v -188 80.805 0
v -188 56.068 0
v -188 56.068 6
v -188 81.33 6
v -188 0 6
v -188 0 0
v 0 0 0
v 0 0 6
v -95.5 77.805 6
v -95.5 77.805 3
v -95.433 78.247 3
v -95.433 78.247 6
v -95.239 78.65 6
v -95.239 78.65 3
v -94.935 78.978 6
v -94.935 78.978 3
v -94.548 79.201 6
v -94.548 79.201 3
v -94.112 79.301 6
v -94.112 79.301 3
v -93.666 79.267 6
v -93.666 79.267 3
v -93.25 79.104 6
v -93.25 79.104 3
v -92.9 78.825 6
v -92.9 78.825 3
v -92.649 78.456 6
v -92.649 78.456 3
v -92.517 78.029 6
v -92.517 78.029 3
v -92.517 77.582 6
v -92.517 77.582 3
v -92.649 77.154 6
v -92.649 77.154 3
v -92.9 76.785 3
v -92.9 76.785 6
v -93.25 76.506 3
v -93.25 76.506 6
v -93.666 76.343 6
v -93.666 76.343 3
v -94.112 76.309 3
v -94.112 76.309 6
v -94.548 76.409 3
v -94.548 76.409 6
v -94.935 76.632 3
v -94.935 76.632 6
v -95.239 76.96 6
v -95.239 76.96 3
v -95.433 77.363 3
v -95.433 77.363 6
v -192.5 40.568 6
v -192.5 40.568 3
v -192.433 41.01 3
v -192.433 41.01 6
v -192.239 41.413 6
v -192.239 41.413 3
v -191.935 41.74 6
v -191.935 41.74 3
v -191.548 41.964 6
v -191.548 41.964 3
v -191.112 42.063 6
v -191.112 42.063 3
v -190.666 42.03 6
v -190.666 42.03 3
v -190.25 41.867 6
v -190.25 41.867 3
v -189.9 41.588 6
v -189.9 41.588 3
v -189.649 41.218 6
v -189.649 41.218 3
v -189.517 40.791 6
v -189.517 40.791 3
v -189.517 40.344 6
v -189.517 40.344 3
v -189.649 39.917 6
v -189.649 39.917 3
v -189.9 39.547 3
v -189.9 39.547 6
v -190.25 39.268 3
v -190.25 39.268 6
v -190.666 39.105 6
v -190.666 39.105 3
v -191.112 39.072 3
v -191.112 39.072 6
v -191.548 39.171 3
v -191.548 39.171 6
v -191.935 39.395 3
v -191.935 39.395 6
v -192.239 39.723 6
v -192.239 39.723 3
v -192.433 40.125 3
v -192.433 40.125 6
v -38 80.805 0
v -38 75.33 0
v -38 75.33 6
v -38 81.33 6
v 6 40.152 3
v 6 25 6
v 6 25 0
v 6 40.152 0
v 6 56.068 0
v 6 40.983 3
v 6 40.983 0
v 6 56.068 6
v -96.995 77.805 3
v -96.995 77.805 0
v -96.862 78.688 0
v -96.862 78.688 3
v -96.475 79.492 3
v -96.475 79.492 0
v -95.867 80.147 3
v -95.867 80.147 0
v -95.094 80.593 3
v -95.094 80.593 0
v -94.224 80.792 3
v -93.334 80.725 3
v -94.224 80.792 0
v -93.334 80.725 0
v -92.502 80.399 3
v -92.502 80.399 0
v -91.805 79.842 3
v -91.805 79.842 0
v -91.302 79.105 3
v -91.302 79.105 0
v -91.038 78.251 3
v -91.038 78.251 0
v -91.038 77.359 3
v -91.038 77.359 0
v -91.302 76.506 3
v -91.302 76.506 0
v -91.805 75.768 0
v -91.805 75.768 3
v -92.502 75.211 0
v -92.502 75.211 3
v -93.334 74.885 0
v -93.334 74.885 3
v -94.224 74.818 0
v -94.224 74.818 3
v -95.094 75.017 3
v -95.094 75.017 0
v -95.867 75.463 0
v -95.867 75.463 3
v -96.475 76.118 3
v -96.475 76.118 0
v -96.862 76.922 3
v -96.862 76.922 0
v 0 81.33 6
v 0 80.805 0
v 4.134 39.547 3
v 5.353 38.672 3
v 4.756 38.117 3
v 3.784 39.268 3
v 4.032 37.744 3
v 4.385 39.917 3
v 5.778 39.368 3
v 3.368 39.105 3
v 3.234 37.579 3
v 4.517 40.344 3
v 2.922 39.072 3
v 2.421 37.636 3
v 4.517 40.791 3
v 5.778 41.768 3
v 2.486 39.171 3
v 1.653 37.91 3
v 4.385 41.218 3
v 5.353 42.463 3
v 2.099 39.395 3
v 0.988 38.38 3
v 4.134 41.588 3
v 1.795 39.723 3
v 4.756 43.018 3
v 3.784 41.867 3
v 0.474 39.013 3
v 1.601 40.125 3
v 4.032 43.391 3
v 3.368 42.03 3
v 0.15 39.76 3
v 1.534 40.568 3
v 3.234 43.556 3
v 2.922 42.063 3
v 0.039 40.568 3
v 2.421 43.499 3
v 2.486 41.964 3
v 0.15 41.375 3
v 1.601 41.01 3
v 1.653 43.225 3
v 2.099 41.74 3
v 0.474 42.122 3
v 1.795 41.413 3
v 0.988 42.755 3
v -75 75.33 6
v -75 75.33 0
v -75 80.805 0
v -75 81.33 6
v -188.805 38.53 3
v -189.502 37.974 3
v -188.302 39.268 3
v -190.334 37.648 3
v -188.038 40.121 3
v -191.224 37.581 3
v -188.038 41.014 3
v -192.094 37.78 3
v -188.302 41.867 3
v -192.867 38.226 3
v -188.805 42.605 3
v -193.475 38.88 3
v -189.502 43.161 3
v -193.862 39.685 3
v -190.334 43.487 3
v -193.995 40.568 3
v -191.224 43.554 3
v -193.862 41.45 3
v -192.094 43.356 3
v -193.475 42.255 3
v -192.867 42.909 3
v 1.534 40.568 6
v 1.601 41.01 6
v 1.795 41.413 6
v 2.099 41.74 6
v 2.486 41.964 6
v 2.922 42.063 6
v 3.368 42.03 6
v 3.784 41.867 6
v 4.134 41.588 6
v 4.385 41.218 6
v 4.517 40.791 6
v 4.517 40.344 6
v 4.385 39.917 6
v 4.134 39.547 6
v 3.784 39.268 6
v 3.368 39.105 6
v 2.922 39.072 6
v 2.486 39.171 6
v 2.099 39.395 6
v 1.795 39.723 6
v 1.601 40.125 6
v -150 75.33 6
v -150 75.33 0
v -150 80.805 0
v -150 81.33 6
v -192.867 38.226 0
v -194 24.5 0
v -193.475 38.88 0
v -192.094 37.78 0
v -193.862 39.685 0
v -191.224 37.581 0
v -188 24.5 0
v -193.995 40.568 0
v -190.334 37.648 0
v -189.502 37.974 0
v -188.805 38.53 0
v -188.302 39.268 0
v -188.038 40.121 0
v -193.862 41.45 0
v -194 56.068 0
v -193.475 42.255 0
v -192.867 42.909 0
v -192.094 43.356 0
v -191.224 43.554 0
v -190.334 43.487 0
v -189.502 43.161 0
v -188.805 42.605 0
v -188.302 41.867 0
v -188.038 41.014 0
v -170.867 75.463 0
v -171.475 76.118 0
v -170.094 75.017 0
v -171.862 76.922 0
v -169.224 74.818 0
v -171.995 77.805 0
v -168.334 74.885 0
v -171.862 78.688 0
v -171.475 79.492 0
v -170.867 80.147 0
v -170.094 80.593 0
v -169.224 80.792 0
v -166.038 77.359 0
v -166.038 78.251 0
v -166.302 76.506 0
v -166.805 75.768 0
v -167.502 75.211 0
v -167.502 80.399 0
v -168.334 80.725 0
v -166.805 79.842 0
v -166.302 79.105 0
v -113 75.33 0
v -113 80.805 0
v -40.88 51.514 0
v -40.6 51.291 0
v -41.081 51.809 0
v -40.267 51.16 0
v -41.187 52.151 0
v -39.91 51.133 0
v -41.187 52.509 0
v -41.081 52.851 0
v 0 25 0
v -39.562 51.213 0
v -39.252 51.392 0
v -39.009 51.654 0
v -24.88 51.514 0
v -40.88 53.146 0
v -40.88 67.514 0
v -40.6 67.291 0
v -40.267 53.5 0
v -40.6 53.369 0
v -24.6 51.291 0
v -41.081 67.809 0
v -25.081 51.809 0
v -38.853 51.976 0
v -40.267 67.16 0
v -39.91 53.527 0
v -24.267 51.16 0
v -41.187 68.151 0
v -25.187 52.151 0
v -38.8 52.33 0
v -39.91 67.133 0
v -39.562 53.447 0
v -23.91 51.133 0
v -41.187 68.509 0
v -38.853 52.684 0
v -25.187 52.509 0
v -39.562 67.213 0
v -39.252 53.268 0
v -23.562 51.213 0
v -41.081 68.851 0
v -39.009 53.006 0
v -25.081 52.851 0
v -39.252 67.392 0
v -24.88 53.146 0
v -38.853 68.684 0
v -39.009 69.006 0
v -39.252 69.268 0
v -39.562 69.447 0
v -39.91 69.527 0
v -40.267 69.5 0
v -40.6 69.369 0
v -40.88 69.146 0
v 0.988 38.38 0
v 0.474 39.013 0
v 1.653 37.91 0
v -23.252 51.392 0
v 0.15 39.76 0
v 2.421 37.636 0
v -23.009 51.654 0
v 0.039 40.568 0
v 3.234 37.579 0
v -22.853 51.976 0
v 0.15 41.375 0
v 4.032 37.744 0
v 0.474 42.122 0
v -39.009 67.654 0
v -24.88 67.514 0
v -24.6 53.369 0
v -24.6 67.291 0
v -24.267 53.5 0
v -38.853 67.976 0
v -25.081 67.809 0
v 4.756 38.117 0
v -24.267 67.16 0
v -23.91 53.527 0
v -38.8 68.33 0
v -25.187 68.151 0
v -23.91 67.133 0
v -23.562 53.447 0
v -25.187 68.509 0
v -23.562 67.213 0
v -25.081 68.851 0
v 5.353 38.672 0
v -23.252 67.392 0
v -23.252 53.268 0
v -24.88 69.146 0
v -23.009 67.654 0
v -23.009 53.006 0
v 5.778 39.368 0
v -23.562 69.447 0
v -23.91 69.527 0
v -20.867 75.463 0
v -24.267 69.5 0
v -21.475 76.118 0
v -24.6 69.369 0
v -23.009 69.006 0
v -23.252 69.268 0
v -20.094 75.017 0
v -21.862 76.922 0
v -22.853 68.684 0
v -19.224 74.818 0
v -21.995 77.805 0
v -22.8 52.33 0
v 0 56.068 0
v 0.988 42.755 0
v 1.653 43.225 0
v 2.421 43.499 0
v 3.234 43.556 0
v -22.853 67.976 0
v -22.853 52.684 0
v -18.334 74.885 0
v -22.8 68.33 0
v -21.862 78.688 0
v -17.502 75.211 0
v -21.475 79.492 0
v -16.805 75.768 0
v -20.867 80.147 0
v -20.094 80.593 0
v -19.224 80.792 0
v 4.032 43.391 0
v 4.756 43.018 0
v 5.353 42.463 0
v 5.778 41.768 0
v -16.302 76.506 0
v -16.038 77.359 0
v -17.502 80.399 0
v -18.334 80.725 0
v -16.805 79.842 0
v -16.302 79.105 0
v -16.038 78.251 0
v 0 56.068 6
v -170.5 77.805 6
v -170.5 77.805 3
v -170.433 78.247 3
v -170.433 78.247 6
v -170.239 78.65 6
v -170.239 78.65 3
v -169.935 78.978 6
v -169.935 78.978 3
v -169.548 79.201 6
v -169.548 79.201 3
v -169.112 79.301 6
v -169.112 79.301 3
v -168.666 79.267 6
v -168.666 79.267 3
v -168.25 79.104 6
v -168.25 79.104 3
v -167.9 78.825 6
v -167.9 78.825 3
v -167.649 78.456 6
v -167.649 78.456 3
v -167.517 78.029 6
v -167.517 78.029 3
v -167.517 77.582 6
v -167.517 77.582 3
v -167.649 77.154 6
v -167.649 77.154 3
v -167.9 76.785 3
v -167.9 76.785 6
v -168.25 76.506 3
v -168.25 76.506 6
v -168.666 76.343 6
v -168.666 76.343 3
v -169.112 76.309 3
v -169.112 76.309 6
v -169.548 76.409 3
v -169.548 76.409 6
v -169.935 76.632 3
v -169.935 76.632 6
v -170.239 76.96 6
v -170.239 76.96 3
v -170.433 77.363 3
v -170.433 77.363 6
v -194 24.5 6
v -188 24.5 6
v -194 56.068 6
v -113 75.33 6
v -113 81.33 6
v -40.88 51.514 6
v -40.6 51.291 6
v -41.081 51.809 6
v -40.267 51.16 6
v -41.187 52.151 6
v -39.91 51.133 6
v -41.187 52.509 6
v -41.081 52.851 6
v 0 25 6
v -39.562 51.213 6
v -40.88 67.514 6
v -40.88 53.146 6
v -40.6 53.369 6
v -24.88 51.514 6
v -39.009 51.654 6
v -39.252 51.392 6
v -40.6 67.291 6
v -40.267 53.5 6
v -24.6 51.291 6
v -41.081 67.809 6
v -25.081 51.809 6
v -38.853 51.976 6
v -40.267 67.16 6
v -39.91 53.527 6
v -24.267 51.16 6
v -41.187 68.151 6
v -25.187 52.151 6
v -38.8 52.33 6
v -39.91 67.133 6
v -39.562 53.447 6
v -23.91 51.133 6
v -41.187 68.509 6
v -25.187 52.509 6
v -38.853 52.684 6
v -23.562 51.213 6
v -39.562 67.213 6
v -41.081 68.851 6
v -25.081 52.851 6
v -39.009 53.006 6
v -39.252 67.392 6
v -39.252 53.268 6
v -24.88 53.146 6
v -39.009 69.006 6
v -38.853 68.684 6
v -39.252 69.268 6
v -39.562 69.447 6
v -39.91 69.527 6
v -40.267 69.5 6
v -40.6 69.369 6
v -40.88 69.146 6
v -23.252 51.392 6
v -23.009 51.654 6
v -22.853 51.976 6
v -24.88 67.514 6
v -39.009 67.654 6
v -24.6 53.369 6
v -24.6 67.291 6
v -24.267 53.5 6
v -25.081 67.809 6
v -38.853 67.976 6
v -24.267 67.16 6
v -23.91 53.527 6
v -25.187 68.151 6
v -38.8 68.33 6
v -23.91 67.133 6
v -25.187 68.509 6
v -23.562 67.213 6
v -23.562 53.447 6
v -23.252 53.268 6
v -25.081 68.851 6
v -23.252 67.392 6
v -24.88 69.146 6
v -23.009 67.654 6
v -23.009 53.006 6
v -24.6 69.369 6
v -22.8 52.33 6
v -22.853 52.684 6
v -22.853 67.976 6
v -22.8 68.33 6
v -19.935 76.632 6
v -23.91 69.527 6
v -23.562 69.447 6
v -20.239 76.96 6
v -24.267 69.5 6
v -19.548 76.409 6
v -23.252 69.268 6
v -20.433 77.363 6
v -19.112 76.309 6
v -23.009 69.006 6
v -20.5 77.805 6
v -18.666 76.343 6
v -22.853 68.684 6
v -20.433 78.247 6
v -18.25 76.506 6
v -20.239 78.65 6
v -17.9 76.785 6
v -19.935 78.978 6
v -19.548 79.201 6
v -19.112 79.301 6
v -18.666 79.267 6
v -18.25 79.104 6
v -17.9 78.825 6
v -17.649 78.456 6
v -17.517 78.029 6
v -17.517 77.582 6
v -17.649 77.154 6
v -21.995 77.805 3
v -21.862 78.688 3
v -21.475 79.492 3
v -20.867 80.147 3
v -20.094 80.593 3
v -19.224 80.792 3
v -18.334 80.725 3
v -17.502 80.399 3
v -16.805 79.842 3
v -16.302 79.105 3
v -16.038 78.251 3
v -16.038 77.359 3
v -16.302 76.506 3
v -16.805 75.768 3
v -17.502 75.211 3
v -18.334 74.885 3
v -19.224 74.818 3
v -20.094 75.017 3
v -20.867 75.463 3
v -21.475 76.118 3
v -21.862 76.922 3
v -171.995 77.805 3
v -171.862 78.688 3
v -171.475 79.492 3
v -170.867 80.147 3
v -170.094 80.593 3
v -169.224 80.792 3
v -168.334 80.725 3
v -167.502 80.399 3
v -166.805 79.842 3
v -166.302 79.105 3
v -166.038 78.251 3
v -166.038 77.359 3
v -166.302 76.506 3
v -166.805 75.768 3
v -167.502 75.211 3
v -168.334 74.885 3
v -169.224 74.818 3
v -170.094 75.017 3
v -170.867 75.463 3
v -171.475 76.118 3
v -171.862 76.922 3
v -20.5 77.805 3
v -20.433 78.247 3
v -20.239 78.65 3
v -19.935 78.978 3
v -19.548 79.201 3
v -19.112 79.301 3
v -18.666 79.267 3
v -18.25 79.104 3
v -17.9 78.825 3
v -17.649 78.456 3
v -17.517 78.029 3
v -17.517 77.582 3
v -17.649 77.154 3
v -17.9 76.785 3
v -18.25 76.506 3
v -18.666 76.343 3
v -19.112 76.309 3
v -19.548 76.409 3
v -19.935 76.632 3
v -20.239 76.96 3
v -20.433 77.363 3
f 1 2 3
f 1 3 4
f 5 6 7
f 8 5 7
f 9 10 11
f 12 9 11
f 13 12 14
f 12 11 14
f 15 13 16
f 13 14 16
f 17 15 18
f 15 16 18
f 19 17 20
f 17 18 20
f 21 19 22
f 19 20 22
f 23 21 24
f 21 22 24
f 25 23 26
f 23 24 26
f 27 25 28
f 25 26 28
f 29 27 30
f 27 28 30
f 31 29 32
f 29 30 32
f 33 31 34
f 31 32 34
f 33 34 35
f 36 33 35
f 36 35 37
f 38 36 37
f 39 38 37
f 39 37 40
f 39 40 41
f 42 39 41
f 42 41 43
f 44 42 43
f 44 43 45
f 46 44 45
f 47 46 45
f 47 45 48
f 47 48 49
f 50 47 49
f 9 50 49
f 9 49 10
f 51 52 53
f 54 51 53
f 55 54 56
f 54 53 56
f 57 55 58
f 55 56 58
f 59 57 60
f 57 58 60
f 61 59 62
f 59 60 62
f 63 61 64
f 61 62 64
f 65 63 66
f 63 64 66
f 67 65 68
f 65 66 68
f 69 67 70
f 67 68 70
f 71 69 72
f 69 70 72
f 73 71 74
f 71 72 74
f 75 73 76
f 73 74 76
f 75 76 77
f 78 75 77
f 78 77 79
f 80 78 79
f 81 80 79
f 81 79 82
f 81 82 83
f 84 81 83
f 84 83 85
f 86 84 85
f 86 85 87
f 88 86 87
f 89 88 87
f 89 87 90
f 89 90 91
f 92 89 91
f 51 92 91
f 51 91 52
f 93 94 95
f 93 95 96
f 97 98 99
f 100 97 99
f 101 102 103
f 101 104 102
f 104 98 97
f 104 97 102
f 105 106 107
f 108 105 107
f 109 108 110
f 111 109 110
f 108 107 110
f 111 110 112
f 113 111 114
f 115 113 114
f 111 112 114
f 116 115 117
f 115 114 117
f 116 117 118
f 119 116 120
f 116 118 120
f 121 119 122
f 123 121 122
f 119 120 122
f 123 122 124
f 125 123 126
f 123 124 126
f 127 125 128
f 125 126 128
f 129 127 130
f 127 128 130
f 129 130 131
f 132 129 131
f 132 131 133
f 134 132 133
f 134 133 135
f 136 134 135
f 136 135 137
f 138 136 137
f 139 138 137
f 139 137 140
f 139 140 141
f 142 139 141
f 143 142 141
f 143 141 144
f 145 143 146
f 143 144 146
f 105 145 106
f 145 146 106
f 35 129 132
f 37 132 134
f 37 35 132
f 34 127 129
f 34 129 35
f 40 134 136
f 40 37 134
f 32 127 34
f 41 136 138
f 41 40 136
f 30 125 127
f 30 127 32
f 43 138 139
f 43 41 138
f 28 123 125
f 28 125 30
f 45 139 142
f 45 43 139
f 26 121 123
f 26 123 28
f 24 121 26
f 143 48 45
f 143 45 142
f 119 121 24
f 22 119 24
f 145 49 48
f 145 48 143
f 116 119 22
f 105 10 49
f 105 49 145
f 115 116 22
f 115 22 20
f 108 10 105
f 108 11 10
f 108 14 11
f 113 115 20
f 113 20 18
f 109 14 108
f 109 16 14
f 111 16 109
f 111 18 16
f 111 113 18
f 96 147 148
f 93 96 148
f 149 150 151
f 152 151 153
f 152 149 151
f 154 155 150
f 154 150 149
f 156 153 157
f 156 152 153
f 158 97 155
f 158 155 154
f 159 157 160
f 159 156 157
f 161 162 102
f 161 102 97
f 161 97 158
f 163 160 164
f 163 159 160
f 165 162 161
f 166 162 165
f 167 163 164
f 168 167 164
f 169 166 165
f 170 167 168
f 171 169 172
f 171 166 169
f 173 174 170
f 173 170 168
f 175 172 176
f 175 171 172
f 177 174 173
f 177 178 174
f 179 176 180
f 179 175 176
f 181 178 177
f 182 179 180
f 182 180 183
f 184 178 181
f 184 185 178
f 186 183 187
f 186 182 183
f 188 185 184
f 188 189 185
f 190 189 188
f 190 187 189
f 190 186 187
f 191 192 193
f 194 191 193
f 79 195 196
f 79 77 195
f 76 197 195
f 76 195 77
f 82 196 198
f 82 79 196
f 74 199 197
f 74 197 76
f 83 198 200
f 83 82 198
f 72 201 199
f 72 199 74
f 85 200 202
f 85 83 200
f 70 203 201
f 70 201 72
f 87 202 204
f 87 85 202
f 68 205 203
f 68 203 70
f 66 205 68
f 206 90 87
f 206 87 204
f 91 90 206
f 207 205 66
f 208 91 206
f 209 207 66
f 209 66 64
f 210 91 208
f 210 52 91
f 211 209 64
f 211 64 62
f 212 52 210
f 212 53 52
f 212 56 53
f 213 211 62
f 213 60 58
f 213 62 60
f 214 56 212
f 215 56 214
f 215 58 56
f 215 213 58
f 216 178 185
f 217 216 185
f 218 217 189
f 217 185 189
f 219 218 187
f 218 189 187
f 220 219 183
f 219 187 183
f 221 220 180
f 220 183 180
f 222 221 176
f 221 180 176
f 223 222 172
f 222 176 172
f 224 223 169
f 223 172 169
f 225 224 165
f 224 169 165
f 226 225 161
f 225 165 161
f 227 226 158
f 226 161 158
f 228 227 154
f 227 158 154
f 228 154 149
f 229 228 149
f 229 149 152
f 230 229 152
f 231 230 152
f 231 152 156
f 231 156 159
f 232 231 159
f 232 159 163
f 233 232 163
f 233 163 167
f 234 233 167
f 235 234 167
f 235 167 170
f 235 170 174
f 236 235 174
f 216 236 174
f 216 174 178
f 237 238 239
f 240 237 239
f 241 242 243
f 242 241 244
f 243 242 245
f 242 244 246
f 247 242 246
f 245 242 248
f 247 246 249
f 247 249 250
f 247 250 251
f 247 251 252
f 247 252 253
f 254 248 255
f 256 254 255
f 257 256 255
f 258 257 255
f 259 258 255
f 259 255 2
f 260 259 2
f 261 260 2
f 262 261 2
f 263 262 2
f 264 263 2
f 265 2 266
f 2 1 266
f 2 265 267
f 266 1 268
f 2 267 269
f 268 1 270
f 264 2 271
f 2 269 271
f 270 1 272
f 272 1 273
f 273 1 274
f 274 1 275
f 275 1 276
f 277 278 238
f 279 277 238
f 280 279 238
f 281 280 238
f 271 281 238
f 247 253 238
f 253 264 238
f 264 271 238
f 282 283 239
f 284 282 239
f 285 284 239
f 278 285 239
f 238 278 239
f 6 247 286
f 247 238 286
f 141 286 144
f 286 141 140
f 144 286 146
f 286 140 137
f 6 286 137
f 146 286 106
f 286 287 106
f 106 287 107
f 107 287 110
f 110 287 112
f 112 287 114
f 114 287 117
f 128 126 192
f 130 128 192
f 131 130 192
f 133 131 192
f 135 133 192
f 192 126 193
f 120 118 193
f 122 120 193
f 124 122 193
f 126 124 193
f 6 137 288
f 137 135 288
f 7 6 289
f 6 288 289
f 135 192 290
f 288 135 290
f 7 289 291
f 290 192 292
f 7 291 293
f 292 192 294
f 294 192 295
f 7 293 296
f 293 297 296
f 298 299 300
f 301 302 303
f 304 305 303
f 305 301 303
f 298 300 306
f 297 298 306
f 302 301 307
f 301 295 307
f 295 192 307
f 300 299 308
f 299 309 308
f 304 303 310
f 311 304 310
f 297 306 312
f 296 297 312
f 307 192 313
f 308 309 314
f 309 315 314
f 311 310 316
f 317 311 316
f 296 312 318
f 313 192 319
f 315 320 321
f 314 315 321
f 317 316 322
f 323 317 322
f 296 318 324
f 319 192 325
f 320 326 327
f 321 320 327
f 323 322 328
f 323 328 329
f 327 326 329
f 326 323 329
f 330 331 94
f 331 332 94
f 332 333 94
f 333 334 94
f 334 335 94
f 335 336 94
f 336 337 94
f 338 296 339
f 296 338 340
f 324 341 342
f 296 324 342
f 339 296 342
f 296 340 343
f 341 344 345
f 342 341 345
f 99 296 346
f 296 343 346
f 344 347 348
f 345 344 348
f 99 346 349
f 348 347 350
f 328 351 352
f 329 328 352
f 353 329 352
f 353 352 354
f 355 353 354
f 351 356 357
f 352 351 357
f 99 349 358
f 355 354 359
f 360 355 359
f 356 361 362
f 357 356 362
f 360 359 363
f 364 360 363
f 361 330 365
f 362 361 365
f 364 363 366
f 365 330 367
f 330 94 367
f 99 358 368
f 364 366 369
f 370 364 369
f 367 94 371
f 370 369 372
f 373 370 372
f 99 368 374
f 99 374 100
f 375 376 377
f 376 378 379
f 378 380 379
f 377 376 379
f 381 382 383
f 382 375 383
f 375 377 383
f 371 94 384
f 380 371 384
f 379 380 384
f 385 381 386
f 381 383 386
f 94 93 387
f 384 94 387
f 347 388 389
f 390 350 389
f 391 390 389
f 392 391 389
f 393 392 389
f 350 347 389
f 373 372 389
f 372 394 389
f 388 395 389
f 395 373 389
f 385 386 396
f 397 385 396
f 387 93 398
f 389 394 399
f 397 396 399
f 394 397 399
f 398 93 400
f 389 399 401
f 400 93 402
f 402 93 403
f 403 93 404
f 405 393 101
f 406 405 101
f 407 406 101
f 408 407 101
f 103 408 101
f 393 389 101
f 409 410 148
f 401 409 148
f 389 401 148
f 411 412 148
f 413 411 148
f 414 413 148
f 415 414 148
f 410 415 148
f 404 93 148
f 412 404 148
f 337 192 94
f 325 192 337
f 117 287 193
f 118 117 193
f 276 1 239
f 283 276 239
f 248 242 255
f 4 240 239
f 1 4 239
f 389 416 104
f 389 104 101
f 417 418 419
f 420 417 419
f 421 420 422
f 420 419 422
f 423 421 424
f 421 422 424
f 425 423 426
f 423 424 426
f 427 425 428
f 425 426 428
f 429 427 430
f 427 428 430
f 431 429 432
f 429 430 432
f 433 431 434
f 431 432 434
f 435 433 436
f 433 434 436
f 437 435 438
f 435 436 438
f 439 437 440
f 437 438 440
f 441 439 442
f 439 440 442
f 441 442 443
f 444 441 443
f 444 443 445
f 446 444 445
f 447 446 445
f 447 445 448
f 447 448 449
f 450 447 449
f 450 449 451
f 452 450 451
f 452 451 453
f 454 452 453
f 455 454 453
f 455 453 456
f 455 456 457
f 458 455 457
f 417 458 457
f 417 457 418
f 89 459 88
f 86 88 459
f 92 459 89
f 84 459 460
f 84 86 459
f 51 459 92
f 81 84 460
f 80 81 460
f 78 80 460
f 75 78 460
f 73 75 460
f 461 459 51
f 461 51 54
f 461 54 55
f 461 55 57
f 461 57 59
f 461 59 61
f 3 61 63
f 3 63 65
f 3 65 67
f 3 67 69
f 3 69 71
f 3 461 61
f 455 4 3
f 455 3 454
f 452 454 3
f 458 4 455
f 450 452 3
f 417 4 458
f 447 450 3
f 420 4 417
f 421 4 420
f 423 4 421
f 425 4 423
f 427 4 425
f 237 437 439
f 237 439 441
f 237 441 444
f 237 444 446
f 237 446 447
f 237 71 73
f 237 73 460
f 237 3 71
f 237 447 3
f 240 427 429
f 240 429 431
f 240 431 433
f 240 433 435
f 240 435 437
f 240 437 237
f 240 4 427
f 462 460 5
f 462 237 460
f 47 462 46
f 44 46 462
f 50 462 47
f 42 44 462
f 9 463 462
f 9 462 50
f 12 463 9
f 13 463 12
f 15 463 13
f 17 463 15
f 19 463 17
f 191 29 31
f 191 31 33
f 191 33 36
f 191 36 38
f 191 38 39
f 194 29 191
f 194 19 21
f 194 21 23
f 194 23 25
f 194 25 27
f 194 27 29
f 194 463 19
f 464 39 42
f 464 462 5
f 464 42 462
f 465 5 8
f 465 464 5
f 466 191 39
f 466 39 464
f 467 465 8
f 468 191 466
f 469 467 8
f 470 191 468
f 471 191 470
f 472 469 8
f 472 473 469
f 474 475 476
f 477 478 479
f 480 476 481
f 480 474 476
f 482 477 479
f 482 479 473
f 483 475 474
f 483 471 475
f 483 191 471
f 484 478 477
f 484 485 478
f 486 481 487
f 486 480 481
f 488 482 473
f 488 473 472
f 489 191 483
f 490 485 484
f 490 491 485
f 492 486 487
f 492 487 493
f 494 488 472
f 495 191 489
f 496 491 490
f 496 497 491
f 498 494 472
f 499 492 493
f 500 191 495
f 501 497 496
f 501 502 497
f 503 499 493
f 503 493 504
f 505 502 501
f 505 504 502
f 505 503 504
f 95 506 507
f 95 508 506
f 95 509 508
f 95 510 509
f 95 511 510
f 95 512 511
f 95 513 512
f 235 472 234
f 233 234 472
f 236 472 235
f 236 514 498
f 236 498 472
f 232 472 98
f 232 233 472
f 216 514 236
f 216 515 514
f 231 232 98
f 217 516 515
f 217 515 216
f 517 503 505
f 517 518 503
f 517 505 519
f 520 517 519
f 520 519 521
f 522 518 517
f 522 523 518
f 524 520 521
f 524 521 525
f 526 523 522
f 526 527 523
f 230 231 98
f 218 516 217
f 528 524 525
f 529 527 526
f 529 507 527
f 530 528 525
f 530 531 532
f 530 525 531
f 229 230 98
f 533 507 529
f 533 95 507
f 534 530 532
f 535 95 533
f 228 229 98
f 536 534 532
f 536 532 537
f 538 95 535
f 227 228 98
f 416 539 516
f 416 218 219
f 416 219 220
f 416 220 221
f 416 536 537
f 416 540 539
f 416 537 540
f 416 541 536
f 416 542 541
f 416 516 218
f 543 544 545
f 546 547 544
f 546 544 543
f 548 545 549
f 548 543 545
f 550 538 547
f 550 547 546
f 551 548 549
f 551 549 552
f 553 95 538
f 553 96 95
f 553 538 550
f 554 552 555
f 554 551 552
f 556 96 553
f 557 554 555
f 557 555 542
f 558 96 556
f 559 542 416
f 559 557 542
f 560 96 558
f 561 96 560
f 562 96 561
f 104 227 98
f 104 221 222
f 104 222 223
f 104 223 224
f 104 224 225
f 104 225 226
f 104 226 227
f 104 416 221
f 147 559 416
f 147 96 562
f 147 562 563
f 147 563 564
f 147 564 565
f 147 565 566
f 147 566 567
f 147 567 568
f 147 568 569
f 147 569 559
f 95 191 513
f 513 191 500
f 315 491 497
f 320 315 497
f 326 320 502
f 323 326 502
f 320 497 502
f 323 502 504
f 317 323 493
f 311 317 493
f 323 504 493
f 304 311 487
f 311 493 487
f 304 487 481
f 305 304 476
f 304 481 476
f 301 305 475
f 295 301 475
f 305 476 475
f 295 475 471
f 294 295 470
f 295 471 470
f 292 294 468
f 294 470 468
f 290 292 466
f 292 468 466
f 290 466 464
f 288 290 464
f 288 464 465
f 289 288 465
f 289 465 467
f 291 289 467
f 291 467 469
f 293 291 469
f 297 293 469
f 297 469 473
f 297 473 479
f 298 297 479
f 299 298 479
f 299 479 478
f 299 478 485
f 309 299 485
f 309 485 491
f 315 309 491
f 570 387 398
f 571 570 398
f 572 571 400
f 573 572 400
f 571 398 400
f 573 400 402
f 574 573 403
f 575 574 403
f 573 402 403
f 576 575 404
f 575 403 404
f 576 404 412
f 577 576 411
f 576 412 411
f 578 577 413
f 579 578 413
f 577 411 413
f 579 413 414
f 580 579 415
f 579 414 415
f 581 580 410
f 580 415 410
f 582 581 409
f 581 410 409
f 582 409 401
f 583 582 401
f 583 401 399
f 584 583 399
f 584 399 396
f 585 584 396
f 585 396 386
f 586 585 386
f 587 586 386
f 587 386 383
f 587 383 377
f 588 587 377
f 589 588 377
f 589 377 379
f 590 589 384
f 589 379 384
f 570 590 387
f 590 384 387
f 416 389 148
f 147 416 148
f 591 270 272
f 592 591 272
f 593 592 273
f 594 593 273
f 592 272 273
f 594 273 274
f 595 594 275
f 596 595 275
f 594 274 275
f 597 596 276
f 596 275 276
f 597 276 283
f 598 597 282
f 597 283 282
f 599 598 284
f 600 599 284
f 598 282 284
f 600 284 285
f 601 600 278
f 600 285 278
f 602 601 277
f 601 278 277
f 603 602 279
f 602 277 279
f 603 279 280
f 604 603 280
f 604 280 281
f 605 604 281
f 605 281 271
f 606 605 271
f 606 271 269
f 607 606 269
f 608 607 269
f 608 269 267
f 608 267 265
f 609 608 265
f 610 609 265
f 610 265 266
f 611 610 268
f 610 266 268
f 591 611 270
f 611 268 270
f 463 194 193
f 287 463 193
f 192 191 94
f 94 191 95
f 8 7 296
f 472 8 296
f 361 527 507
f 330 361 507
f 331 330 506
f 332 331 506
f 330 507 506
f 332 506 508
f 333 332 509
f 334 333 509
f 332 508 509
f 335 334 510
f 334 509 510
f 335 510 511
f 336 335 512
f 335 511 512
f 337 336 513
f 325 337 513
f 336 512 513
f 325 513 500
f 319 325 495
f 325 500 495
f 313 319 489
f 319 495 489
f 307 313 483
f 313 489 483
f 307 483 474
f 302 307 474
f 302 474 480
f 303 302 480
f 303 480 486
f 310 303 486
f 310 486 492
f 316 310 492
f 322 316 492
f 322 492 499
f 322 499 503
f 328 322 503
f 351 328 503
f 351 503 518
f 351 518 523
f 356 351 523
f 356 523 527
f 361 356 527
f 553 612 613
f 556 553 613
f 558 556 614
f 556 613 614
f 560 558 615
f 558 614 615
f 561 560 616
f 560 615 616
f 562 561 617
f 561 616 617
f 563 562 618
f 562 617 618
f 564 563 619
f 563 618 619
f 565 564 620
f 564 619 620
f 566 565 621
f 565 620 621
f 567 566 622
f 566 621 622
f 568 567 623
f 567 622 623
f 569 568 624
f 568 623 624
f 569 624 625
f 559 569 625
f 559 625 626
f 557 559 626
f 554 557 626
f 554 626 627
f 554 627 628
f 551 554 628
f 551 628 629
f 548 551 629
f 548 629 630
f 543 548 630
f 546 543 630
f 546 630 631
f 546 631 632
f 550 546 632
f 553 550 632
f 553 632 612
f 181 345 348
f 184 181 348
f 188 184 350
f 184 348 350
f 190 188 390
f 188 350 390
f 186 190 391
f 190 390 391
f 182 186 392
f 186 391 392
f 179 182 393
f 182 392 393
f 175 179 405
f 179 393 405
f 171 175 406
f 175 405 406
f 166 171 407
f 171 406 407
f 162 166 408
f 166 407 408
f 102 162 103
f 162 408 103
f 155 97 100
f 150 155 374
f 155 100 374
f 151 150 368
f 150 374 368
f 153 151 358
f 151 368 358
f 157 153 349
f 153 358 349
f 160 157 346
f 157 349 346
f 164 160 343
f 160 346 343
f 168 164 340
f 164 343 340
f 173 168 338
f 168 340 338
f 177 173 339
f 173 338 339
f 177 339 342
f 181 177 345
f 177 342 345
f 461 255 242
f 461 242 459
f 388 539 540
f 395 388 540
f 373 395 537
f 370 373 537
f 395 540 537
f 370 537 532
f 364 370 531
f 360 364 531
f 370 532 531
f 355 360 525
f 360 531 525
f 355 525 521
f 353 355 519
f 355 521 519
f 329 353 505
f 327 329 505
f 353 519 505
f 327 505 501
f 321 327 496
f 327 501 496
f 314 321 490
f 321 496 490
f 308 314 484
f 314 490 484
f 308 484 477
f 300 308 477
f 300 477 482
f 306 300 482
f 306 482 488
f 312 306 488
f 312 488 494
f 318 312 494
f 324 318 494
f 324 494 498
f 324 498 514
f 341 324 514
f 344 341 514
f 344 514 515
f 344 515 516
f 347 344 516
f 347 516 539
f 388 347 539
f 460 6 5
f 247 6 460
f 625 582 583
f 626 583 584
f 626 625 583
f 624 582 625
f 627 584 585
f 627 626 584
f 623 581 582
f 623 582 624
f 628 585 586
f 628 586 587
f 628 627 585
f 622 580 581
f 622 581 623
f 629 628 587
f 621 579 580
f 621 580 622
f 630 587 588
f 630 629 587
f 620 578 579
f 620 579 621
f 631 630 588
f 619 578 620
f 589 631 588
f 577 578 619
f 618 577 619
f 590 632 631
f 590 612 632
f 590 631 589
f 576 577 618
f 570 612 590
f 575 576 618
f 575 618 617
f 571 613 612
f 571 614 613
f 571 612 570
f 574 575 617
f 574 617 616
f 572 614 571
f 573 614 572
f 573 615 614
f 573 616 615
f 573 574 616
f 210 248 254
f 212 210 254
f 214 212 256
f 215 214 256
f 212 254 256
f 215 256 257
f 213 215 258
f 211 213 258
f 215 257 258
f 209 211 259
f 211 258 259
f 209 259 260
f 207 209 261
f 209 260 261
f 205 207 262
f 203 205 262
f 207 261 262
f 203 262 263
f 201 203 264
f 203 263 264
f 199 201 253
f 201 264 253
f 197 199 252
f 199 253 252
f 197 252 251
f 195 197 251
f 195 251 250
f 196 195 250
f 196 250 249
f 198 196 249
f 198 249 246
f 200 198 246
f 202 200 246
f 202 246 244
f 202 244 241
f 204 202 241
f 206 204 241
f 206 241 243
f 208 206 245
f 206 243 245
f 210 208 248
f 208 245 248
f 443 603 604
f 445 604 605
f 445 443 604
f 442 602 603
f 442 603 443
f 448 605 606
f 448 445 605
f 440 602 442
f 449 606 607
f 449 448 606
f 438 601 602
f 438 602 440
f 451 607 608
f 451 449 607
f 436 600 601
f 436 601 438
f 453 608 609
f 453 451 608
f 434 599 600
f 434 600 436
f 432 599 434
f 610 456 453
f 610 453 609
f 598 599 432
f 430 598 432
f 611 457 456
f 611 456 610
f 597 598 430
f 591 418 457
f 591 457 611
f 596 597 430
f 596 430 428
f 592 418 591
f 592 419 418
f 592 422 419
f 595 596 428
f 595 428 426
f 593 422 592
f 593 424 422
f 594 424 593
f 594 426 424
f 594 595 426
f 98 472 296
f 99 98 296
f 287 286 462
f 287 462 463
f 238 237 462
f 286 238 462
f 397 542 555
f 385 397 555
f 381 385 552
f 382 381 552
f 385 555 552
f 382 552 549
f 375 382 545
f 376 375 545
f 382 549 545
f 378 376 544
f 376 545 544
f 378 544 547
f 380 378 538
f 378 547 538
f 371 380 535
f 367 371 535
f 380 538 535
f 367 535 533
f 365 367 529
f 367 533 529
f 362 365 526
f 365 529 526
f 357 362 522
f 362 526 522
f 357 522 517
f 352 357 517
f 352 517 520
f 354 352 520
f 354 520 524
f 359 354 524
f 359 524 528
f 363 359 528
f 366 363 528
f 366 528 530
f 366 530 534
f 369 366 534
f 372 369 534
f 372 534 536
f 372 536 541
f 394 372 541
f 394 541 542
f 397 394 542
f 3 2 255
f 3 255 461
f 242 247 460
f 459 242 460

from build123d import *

# Parameters (mm, degrees)
ESQUISSE1_W                  = 188
ESQUISSE1_H                  = 81.33
BOSS_EXTRU_1_DEPTH           = 6
ENL_V_MAT_EXTRU_2_DEPTH      = 205.925764364
ENL_V_MAT_EXTRU_2_DEPTH_BACK = 205.925764364
ESQUISSE4_W                  = 6
ESQUISSE4_H                  = 31.567534009
BOSS_EXTRU_2_DEPTH           = 6
ESQUISSE5_W                  = 6
ESQUISSE5_H                  = 31.067534009
BOSS_EXTRU_3_DEPTH           = 6
ESQUISSE6_W                  = 37
ESQUISSE6_H                  = 6
ENL_V_MAT_EXTRU_3_DEPTH      = 6
ESQUISSE7_R                  = 2.995
ENL_V_MAT_EXTRU_4_DEPTH      = 3
ESQUISSE8_R                  = 1.5
ENL_V_MAT_EXTRU_5_DEPTH      = 6
ESQUISSE9_R                  = 1.2
ENL_V_MAT_EXTRU_6_DEPTH      = 10


with BuildPart() as part:
    # Esquisse1 → Boss.-Extru.1 (new body)
    with BuildSketch(Plane.XY):
        with Locations((-94, 40.665)):
            Rectangle(ESQUISSE1_W, ESQUISSE1_H)
    extrude(amount=BOSS_EXTRU_1_DEPTH)

    # Esquisse2 → Enlèv. mat.-Extru.2 (cut, two sides: drawn at the far end of the back side and taken through both)
    with BuildSketch(Plane.ZY.offset(188).offset(-ENL_V_MAT_EXTRU_2_DEPTH_BACK)):
        Polygon((178.443334928, 96.416836907), (6, 81.33), (0, 80.805068019), (-172.443334928, 65.718231112), (-202.617008742, 410.604900969), (148.269661115, 441.303506764), align=None)
    extrude(amount=ENL_V_MAT_EXTRU_2_DEPTH + ENL_V_MAT_EXTRU_2_DEPTH_BACK, mode=Mode.SUBTRACT)

    # Esquisse4 → Boss.-Extru.2 (add)
    with BuildSketch(Plane.ZY.offset(188)):
        with Locations((3, 40.283767005)):
            Rectangle(ESQUISSE4_W, ESQUISSE4_H)
    extrude(amount=BOSS_EXTRU_2_DEPTH)

    # Esquisse5 → Boss.-Extru.3 (add)
    with BuildSketch(Plane(origin=(0, 0, 0), x_dir=(0, 0, -1), z_dir=(1, 0, 0))):
        with Locations((-3, 40.533767005)):
            Rectangle(ESQUISSE5_W, ESQUISSE5_H)
    extrude(amount=BOSS_EXTRU_3_DEPTH)

    # Esquisse6 → Enlèv. mat.-Extru.3 (cut)
    with BuildSketch(Plane.XY.offset(6)):
        with Locations((-131.5, 78.33)):
            Rectangle(ESQUISSE6_W, ESQUISSE6_H)
        with Locations((-56.5, 78.33)):
            Rectangle(ESQUISSE6_W, ESQUISSE6_H)
    extrude(amount=-ENL_V_MAT_EXTRU_3_DEPTH, mode=Mode.SUBTRACT)

    # Esquisse7 → Enlèv. mat.-Extru.4 (cut)
    with BuildSketch(Plane(origin=(0, 0, 0), x_dir=(-1, 0, 0), z_dir=(0, 0, -1))):
        with Locations((94, 77.805068019)):
            Circle(ESQUISSE7_R)
        with Locations((19, 77.805068019)):
            Circle(ESQUISSE7_R)
        with Locations((169, 77.805068019)):
            Circle(ESQUISSE7_R)
        with Locations((191, 40.567534009)):
            Circle(ESQUISSE7_R)
        with Locations((-3.034014412, 40.567534009)):
            Circle(ESQUISSE7_R)
    extrude(amount=-ENL_V_MAT_EXTRU_4_DEPTH, mode=Mode.SUBTRACT)

    # Esquisse8 → Enlèv. mat.-Extru.5 (cut)
    with BuildSketch(Plane(origin=(0, 0, 0), x_dir=(-1, 0, 0), z_dir=(0, 0, -1))):
        with Locations((-3.034014412, 40.567534009)):
            Circle(ESQUISSE8_R)
        with Locations((19, 77.805068019)):
            Circle(ESQUISSE8_R)
        with Locations((94, 77.805068019)):
            Circle(ESQUISSE8_R)
        with Locations((169, 77.805068019)):
            Circle(ESQUISSE8_R)
        with Locations((191, 40.567534009)):
            Circle(ESQUISSE8_R)
    extrude(amount=-ENL_V_MAT_EXTRU_5_DEPTH, mode=Mode.SUBTRACT)

    # Esquisse9 → Enlèv. mat.-Extru.6 (cut)
    with BuildSketch(Plane.XY.offset(6)):
        with Locations((-24, 68.33)):
            Circle(ESQUISSE9_R)
        with Locations((-24, 52.33)):
            Circle(ESQUISSE9_R)
        with Locations((-40, 68.33)):
            Circle(ESQUISSE9_R)
        with Locations((-40, 52.33)):
            Circle(ESQUISSE9_R)
    extrude(amount=-ENL_V_MAT_EXTRU_6_DEPTH, mode=Mode.SUBTRACT)


solid = part.part
